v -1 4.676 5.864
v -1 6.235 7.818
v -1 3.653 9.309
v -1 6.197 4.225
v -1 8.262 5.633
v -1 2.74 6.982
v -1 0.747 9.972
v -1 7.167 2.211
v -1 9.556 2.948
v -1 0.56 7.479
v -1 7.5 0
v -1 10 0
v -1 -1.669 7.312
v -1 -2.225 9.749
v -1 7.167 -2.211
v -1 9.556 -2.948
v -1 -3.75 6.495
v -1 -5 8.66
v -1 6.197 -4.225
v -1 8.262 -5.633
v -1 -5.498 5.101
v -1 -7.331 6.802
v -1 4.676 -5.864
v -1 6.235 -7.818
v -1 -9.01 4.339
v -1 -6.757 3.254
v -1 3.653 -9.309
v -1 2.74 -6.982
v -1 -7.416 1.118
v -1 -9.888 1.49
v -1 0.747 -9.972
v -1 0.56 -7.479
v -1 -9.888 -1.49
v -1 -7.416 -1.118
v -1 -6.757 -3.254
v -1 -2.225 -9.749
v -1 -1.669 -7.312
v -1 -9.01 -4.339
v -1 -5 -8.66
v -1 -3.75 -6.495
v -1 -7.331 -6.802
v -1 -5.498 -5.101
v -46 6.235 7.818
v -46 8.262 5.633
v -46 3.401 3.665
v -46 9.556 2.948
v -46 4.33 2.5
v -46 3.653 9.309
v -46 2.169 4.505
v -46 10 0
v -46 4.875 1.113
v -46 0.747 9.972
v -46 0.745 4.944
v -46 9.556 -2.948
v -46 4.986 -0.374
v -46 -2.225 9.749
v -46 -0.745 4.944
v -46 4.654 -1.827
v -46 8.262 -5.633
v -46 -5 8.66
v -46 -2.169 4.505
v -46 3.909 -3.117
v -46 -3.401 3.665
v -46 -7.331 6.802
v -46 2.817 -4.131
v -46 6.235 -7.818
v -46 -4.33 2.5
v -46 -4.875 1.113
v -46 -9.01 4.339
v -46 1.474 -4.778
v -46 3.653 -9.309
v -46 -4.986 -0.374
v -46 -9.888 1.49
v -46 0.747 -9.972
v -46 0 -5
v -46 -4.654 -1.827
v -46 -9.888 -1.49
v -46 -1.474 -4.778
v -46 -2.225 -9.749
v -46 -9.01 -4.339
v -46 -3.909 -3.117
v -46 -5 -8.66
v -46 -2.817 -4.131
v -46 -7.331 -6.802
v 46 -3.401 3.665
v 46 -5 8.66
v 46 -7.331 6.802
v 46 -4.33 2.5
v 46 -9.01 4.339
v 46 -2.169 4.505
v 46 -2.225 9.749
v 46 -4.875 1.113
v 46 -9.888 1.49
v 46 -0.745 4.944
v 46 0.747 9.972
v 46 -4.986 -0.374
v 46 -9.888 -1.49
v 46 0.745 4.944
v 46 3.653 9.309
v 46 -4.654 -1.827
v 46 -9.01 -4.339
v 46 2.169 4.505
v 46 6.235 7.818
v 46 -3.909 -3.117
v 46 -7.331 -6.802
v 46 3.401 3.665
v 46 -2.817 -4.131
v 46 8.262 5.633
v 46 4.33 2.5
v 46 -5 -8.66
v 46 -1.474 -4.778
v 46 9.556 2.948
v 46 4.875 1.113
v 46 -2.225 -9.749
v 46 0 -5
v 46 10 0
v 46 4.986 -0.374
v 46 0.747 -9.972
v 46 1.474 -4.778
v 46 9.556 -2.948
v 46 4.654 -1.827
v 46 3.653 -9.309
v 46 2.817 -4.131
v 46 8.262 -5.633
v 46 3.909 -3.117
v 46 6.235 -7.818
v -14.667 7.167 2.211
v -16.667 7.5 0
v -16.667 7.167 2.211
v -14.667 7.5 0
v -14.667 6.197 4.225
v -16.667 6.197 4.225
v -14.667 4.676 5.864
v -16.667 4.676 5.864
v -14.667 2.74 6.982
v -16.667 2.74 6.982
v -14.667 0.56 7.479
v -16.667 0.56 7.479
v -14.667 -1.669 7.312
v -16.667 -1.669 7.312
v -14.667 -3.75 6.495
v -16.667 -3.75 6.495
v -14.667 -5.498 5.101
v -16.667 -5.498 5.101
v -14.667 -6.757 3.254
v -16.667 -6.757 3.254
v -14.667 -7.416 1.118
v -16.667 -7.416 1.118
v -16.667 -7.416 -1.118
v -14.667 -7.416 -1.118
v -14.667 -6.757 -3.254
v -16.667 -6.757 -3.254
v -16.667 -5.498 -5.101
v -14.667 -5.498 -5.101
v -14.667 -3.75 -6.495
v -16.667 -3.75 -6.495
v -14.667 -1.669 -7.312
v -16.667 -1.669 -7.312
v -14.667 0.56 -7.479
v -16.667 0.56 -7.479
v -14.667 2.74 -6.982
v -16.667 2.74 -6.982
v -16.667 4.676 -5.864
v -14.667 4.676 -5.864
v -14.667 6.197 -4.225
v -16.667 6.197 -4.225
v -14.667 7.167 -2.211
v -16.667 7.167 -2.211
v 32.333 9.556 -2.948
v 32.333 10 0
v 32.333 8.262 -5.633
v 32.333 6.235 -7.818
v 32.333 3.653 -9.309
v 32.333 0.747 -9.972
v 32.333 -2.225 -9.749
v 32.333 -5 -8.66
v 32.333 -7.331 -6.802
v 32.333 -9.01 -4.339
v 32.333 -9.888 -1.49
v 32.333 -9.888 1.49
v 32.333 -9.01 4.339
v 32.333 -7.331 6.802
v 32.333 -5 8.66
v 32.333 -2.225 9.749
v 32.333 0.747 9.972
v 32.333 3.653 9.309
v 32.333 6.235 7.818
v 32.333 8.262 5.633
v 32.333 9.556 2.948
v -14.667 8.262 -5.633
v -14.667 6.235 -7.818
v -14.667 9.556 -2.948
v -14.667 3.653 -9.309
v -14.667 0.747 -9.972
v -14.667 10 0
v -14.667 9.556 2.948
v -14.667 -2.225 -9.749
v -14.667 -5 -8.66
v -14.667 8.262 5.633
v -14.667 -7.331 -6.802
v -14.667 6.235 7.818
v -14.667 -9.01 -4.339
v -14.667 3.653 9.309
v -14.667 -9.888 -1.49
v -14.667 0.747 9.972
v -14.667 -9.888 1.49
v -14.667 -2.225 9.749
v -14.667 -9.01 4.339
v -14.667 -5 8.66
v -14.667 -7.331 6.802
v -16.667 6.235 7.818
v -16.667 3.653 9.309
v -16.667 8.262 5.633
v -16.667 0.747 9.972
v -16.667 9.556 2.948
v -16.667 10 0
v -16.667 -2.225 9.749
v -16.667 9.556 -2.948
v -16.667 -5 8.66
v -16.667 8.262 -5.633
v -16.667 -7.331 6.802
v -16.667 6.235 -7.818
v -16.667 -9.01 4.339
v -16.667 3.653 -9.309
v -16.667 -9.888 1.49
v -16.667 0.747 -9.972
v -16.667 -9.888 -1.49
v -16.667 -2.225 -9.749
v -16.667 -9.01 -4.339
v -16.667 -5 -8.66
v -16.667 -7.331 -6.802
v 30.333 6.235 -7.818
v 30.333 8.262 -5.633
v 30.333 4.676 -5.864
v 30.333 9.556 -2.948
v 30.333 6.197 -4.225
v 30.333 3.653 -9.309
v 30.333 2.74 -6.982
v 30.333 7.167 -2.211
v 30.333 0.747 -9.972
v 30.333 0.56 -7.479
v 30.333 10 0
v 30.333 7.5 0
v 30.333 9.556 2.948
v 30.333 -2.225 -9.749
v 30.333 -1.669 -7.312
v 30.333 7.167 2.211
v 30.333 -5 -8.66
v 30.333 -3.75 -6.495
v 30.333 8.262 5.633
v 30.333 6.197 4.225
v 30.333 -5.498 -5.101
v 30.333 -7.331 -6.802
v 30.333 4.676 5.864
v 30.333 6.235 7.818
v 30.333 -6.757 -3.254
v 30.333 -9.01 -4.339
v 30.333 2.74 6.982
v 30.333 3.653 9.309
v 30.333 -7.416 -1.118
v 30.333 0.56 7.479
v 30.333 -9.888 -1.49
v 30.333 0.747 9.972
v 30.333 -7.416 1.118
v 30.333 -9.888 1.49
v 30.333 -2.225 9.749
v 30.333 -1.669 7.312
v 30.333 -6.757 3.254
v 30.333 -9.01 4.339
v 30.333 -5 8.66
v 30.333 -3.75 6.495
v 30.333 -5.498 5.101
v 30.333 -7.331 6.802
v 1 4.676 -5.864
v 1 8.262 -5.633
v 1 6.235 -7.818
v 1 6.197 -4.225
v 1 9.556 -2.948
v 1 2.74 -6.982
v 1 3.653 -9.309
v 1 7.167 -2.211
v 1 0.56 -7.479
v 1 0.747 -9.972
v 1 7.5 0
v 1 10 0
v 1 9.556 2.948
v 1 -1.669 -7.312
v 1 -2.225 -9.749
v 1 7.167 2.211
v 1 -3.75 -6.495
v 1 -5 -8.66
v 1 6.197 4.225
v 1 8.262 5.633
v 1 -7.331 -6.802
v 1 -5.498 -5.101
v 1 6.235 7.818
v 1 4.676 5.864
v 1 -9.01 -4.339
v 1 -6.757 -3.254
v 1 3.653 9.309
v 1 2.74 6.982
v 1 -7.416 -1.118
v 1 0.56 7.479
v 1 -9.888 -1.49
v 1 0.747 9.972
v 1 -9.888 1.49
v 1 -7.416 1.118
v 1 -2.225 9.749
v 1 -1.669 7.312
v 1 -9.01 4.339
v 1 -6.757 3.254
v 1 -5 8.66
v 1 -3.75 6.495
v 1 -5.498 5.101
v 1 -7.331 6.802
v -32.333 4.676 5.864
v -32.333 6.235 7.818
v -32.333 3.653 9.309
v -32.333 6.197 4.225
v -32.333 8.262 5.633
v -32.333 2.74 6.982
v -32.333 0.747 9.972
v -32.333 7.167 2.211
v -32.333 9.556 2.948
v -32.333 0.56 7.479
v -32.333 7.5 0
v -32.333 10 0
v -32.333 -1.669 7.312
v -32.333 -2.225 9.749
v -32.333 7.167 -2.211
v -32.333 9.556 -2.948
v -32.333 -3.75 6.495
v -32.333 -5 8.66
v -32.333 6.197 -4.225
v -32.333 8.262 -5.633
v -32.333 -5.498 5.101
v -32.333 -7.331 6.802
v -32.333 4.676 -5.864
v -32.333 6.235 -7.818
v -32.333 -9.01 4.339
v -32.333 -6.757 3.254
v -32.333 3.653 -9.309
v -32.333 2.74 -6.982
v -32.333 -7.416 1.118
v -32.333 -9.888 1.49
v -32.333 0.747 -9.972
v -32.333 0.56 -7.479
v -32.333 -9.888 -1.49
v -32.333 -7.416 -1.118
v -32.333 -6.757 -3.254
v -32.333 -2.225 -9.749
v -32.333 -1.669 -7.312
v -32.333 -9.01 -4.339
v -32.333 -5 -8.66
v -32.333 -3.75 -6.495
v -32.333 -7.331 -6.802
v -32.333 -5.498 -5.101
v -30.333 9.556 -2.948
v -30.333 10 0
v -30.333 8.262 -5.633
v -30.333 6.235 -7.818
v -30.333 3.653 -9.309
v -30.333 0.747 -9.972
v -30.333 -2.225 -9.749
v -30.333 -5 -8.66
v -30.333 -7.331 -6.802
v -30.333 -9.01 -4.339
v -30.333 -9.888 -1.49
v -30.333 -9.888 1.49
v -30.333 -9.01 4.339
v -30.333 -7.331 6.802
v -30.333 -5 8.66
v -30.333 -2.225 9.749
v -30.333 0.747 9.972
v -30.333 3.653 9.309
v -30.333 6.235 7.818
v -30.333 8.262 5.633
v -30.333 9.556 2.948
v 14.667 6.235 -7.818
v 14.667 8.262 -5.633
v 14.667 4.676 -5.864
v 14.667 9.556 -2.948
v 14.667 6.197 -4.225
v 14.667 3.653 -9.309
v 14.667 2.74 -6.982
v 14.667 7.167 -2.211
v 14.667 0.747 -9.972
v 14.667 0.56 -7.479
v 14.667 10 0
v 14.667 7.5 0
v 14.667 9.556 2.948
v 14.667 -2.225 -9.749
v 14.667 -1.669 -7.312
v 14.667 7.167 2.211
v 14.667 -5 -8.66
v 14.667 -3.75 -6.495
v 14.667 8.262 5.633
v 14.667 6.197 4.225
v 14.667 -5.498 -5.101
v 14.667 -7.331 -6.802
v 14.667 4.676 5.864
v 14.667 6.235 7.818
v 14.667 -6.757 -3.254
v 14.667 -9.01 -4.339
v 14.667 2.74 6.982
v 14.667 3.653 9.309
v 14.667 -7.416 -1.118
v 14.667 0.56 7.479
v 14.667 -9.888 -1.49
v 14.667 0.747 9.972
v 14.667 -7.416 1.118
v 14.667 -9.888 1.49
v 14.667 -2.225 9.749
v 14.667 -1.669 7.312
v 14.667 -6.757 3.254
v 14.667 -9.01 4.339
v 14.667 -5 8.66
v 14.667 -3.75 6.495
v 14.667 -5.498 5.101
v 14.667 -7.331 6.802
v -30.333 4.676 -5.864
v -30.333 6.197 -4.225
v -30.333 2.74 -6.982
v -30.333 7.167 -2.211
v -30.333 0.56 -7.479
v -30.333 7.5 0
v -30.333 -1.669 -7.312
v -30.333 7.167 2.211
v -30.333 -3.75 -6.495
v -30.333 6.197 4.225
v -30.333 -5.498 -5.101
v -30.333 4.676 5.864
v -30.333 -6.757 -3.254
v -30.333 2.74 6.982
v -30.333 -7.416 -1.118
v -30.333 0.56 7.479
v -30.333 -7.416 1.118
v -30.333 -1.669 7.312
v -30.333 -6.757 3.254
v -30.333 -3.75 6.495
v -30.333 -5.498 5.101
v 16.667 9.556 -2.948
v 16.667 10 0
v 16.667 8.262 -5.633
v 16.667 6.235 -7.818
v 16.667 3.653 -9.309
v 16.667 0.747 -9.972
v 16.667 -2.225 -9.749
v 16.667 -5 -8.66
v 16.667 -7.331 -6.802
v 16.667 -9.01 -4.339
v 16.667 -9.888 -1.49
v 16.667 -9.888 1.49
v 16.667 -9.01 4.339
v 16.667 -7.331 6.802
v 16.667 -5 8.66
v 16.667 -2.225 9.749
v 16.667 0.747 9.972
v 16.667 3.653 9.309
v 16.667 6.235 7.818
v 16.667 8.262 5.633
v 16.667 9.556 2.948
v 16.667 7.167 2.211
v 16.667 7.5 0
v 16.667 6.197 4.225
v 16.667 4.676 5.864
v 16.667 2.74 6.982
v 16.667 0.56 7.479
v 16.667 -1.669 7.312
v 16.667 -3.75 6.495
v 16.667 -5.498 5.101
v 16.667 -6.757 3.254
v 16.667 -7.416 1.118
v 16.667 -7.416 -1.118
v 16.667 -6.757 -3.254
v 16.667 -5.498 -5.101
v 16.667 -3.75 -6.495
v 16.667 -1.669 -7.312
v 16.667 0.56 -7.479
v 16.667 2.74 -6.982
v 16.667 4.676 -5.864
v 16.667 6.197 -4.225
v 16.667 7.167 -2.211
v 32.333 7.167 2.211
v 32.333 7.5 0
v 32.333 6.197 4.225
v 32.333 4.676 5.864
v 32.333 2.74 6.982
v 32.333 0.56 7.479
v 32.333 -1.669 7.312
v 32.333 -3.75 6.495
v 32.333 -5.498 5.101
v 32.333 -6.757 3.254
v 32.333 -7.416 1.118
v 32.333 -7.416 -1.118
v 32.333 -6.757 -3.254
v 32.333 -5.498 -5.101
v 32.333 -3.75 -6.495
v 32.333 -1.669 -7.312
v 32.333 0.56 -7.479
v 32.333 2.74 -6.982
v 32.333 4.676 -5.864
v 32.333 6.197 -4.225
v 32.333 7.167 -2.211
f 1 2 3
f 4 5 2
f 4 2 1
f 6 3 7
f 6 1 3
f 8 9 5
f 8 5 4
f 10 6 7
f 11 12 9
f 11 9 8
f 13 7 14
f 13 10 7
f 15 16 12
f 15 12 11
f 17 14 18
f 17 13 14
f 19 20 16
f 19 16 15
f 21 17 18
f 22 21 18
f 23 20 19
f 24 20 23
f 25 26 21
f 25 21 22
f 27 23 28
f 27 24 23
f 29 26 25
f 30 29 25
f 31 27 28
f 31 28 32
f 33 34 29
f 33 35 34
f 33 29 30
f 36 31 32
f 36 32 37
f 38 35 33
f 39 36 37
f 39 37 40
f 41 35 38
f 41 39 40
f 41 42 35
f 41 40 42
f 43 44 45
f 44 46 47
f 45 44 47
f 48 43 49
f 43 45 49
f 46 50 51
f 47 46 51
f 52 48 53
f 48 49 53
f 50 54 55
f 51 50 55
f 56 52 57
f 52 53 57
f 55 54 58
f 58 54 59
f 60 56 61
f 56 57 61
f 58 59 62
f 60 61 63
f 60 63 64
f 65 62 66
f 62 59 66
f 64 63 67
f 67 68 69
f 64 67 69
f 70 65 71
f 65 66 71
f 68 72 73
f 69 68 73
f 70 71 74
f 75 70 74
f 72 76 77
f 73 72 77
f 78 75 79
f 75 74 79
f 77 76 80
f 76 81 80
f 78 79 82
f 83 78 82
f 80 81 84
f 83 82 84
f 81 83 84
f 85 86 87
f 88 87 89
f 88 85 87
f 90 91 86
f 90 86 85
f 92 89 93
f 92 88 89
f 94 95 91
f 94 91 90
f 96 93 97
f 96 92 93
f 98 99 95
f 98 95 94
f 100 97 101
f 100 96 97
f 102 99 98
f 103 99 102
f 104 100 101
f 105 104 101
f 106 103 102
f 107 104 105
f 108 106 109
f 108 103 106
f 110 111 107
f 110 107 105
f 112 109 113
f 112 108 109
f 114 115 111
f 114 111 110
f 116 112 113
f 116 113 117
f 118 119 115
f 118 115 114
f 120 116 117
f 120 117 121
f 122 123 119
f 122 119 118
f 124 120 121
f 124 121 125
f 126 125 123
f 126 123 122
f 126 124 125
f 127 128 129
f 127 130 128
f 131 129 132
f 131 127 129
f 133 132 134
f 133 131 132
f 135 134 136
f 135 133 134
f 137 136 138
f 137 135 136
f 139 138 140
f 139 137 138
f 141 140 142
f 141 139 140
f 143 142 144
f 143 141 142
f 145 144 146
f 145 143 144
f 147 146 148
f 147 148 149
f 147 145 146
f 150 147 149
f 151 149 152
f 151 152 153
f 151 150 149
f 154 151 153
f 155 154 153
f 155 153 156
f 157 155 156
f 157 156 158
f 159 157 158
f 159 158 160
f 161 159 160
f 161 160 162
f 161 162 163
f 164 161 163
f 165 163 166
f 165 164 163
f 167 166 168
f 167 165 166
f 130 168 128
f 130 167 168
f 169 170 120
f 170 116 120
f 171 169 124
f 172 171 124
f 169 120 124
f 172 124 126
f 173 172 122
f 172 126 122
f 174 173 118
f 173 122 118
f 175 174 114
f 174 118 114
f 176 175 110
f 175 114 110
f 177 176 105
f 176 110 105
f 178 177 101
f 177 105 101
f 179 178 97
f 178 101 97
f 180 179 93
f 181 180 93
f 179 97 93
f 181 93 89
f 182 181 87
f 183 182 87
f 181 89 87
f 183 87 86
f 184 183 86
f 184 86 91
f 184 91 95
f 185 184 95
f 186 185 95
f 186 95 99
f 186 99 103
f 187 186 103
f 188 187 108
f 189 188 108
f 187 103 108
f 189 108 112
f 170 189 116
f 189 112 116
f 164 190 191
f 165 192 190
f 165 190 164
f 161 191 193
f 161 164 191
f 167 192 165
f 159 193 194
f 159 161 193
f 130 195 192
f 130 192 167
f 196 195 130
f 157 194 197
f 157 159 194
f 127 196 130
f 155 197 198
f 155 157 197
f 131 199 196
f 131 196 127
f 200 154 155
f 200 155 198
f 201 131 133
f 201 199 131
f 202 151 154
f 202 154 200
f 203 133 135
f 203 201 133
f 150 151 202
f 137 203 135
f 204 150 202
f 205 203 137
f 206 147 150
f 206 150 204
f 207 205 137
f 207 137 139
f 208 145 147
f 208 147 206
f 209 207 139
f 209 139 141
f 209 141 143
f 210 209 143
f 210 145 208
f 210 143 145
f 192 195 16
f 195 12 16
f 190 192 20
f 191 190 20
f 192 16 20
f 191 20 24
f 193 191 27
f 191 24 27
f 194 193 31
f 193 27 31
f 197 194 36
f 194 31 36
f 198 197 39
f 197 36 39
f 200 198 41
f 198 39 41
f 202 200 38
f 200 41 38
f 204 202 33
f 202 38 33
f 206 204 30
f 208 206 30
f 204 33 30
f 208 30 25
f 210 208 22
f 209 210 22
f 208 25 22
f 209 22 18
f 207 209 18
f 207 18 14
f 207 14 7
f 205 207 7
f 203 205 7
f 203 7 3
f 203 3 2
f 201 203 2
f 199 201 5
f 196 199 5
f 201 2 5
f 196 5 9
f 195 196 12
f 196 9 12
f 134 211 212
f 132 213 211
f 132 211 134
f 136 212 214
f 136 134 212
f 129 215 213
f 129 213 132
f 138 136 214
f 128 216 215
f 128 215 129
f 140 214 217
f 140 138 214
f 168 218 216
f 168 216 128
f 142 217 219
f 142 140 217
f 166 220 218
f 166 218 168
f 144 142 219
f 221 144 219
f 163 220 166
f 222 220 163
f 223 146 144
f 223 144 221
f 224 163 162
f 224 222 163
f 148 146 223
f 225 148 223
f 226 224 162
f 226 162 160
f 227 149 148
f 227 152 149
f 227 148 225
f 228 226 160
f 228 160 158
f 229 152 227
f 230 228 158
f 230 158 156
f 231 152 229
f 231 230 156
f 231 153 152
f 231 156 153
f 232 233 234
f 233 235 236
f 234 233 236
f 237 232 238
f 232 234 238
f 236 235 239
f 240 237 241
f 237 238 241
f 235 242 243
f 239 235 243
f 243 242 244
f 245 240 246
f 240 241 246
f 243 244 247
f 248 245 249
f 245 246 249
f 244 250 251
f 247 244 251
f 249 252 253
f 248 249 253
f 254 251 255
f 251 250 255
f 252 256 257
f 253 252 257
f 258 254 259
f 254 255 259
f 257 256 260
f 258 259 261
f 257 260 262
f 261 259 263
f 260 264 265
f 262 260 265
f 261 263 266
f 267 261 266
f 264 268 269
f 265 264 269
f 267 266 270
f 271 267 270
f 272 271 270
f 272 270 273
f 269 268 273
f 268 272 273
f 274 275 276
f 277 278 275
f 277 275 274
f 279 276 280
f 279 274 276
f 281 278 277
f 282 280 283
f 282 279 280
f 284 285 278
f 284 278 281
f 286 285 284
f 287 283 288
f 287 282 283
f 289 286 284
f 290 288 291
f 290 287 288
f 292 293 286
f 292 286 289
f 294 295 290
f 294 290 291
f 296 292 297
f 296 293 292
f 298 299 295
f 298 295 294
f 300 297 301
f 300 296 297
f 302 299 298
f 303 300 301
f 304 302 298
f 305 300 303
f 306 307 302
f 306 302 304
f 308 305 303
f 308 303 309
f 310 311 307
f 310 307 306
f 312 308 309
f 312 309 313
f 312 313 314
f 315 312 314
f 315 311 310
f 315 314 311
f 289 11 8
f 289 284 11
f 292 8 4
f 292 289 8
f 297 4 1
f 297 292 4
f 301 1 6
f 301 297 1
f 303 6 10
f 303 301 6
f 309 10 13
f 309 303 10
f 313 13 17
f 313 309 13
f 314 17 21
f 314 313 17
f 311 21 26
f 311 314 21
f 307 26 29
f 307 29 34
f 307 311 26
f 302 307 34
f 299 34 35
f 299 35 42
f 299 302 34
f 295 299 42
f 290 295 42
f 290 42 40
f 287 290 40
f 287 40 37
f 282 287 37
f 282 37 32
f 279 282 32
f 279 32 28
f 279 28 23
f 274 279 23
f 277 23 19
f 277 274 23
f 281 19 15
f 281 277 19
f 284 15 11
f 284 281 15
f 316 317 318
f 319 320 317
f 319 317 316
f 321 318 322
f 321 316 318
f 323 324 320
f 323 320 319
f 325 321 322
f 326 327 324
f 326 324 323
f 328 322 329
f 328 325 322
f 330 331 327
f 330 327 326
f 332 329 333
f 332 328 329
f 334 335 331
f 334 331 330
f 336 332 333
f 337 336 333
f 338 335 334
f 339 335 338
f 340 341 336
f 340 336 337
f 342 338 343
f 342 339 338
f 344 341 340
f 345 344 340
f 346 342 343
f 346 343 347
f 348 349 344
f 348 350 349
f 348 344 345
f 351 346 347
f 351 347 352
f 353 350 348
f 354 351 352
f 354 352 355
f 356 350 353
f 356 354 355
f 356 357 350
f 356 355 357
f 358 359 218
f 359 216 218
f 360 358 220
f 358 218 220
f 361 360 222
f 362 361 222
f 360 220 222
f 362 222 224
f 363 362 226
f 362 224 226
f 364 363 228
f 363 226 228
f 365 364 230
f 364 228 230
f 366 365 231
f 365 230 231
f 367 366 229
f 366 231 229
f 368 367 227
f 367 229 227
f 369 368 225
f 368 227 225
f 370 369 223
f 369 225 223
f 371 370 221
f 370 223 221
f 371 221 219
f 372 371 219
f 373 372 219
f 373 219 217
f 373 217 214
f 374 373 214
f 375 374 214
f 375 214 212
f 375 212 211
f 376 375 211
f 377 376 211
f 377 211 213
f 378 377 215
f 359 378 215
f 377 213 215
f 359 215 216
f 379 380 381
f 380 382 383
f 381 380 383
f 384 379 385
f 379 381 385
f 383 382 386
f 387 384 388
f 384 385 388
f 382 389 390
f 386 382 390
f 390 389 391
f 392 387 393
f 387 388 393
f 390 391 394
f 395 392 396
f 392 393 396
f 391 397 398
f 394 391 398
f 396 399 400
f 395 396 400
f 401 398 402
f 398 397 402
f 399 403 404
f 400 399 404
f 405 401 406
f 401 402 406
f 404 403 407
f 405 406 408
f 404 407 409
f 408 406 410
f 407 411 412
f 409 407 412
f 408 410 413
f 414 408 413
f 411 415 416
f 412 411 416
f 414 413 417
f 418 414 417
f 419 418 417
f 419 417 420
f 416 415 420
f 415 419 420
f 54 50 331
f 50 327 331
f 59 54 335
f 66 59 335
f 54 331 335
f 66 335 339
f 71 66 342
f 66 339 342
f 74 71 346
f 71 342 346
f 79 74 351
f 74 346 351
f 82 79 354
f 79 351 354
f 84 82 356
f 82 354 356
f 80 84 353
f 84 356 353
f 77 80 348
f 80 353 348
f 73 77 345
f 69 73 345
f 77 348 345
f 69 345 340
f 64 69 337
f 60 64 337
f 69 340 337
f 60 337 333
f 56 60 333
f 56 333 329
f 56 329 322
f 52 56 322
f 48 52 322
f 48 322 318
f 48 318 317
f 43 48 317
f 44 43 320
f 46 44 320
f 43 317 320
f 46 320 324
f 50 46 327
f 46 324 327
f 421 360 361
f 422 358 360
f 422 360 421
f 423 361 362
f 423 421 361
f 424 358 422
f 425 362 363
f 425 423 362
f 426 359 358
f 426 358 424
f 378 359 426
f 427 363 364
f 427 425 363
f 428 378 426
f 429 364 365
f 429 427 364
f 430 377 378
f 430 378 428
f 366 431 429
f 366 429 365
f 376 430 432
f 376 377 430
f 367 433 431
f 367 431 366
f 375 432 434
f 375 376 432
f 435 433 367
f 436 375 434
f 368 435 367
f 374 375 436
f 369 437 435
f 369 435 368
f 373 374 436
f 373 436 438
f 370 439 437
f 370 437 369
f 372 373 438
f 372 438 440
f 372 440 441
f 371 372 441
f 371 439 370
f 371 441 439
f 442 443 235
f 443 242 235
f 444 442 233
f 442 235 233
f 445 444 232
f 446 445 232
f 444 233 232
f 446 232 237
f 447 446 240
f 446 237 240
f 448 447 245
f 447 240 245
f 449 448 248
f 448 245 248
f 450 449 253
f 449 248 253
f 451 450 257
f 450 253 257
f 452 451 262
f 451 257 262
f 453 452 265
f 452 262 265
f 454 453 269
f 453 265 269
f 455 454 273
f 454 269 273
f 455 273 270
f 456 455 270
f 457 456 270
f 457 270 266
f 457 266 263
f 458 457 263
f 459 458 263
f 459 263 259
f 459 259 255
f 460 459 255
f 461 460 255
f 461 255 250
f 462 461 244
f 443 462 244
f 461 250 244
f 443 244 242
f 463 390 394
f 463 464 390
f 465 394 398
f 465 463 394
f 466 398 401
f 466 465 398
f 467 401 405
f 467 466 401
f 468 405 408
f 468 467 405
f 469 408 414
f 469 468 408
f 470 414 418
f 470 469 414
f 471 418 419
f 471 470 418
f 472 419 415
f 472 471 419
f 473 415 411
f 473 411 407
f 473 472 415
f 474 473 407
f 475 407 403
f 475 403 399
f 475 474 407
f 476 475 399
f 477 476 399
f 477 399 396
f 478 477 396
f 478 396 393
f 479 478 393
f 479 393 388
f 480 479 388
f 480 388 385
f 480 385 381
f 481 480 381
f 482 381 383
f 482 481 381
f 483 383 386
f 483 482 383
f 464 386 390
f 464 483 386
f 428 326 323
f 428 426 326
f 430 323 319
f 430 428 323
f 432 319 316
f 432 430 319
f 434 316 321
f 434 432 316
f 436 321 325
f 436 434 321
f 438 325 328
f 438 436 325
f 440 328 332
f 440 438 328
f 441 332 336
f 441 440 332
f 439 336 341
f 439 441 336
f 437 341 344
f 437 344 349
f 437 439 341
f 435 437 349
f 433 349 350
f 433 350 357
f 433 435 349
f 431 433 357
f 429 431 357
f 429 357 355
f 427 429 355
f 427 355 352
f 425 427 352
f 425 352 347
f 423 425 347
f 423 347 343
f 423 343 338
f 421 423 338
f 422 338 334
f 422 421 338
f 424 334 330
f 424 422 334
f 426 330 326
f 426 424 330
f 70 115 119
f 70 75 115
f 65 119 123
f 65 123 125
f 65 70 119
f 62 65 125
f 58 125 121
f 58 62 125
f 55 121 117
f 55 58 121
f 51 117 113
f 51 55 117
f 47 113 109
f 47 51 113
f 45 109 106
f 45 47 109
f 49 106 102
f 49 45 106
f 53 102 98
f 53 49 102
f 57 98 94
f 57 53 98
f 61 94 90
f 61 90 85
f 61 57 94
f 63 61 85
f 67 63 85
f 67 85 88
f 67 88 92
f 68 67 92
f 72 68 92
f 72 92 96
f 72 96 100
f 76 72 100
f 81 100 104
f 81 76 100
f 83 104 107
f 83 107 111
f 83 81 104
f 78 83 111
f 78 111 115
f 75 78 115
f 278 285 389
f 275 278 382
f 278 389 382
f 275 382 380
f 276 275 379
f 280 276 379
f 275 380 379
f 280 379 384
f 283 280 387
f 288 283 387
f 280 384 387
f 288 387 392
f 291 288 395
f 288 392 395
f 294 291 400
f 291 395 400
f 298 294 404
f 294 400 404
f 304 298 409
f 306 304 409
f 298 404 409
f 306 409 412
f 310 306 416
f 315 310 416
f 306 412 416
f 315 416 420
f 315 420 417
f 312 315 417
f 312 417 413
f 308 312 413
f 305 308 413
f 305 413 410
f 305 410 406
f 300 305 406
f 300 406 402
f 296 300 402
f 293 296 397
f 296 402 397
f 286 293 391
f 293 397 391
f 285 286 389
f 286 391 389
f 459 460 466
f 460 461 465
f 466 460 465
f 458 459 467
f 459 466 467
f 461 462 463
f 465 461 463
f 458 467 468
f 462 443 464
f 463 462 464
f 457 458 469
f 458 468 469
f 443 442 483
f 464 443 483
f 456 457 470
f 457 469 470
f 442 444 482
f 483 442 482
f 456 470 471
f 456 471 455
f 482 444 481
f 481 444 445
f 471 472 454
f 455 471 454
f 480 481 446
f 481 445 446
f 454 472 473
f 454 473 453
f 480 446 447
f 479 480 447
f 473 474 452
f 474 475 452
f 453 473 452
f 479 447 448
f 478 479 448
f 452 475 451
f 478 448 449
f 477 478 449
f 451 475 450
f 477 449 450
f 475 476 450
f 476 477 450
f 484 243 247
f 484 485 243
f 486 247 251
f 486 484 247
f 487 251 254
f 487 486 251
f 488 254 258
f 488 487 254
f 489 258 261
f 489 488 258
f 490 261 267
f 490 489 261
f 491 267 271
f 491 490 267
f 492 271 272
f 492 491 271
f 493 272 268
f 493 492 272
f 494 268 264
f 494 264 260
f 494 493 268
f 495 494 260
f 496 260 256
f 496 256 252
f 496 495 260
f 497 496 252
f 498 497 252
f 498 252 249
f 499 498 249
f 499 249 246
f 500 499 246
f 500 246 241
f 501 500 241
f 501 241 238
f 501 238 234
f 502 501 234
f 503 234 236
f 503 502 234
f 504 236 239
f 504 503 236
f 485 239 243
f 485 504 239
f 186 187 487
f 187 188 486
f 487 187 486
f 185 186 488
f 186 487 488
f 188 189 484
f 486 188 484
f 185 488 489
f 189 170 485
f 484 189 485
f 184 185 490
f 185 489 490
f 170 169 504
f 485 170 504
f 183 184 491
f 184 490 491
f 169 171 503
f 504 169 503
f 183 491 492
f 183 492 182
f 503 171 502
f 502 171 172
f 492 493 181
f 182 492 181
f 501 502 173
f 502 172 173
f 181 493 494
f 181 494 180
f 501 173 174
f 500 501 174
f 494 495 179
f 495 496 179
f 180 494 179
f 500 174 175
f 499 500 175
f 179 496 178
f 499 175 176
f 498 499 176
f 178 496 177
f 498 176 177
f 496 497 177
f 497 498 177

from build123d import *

# Parameters (mm, degrees)
SKETCH_1_R      = 8.5
SKETCH_1_R_2    = 5
EXTRUDE_1_DEPTH = 46
SKETCH_3_W      = 2
SKETCH_3_H      = 1
SKETCH_4_W      = 13.666666667
SKETCH_4_H      = 1.5
SKETCH_4_W_2    = 13.666666666


with BuildPart() as part:
    # 草圖1 → 填料-伸長1 (new body, symmetric)
    with BuildSketch(Plane(origin=(0, 0, 0), x_dir=(0, 0, -1), z_dir=(1, 0, 0))):
        Circle(SKETCH_1_R)
        Circle(SKETCH_1_R_2, mode=Mode.SUBTRACT)
    extrude(amount=EXTRUDE_1_DEPTH, both=True)

    # 草圖3 → 除料-旋轉1 (revolve, cut)
    with BuildSketch(Plane.XY):
        with Locations((31.333333333, 8)):
            Rectangle(SKETCH_3_W, SKETCH_3_H)
        with Locations((15.666666667, 8)):
            Rectangle(SKETCH_3_W, SKETCH_3_H)
        with Locations((0, 8)):
            Rectangle(SKETCH_3_W, SKETCH_3_H)
        with Locations((-15.666666667, 8)):
            Rectangle(SKETCH_3_W, SKETCH_3_H)
        with Locations((-31.333333333, 8)):
            Rectangle(SKETCH_3_W, SKETCH_3_H)
    revolve(axis=Axis((-98.82156335, 0, 0), (1, 0, 0)), mode=Mode.SUBTRACT)

    # 草圖4 → 旋轉2 (revolve)
    with BuildSketch(Plane.XY):
        with Locations((-39.166666666, 9.25)):
            Rectangle(SKETCH_4_W, SKETCH_4_H)
        with Locations((-23.5, 9.25)):
            Rectangle(SKETCH_4_W_2, SKETCH_4_H)
        with Locations((-7.833333334, 9.25)):
            Rectangle(SKETCH_4_W, SKETCH_4_H)
        with Locations((7.833333334, 9.25)):
            Rectangle(SKETCH_4_W, SKETCH_4_H)
        with Locations((23.5, 9.25)):
            Rectangle(SKETCH_4_W_2, SKETCH_4_H)
        with Locations((39.166666666, 9.25)):
            Rectangle(SKETCH_4_W, SKETCH_4_H)
    revolve(axis=Axis((58.089826766, 0, 0), (-1, 0, 0)))


solid = part.part
